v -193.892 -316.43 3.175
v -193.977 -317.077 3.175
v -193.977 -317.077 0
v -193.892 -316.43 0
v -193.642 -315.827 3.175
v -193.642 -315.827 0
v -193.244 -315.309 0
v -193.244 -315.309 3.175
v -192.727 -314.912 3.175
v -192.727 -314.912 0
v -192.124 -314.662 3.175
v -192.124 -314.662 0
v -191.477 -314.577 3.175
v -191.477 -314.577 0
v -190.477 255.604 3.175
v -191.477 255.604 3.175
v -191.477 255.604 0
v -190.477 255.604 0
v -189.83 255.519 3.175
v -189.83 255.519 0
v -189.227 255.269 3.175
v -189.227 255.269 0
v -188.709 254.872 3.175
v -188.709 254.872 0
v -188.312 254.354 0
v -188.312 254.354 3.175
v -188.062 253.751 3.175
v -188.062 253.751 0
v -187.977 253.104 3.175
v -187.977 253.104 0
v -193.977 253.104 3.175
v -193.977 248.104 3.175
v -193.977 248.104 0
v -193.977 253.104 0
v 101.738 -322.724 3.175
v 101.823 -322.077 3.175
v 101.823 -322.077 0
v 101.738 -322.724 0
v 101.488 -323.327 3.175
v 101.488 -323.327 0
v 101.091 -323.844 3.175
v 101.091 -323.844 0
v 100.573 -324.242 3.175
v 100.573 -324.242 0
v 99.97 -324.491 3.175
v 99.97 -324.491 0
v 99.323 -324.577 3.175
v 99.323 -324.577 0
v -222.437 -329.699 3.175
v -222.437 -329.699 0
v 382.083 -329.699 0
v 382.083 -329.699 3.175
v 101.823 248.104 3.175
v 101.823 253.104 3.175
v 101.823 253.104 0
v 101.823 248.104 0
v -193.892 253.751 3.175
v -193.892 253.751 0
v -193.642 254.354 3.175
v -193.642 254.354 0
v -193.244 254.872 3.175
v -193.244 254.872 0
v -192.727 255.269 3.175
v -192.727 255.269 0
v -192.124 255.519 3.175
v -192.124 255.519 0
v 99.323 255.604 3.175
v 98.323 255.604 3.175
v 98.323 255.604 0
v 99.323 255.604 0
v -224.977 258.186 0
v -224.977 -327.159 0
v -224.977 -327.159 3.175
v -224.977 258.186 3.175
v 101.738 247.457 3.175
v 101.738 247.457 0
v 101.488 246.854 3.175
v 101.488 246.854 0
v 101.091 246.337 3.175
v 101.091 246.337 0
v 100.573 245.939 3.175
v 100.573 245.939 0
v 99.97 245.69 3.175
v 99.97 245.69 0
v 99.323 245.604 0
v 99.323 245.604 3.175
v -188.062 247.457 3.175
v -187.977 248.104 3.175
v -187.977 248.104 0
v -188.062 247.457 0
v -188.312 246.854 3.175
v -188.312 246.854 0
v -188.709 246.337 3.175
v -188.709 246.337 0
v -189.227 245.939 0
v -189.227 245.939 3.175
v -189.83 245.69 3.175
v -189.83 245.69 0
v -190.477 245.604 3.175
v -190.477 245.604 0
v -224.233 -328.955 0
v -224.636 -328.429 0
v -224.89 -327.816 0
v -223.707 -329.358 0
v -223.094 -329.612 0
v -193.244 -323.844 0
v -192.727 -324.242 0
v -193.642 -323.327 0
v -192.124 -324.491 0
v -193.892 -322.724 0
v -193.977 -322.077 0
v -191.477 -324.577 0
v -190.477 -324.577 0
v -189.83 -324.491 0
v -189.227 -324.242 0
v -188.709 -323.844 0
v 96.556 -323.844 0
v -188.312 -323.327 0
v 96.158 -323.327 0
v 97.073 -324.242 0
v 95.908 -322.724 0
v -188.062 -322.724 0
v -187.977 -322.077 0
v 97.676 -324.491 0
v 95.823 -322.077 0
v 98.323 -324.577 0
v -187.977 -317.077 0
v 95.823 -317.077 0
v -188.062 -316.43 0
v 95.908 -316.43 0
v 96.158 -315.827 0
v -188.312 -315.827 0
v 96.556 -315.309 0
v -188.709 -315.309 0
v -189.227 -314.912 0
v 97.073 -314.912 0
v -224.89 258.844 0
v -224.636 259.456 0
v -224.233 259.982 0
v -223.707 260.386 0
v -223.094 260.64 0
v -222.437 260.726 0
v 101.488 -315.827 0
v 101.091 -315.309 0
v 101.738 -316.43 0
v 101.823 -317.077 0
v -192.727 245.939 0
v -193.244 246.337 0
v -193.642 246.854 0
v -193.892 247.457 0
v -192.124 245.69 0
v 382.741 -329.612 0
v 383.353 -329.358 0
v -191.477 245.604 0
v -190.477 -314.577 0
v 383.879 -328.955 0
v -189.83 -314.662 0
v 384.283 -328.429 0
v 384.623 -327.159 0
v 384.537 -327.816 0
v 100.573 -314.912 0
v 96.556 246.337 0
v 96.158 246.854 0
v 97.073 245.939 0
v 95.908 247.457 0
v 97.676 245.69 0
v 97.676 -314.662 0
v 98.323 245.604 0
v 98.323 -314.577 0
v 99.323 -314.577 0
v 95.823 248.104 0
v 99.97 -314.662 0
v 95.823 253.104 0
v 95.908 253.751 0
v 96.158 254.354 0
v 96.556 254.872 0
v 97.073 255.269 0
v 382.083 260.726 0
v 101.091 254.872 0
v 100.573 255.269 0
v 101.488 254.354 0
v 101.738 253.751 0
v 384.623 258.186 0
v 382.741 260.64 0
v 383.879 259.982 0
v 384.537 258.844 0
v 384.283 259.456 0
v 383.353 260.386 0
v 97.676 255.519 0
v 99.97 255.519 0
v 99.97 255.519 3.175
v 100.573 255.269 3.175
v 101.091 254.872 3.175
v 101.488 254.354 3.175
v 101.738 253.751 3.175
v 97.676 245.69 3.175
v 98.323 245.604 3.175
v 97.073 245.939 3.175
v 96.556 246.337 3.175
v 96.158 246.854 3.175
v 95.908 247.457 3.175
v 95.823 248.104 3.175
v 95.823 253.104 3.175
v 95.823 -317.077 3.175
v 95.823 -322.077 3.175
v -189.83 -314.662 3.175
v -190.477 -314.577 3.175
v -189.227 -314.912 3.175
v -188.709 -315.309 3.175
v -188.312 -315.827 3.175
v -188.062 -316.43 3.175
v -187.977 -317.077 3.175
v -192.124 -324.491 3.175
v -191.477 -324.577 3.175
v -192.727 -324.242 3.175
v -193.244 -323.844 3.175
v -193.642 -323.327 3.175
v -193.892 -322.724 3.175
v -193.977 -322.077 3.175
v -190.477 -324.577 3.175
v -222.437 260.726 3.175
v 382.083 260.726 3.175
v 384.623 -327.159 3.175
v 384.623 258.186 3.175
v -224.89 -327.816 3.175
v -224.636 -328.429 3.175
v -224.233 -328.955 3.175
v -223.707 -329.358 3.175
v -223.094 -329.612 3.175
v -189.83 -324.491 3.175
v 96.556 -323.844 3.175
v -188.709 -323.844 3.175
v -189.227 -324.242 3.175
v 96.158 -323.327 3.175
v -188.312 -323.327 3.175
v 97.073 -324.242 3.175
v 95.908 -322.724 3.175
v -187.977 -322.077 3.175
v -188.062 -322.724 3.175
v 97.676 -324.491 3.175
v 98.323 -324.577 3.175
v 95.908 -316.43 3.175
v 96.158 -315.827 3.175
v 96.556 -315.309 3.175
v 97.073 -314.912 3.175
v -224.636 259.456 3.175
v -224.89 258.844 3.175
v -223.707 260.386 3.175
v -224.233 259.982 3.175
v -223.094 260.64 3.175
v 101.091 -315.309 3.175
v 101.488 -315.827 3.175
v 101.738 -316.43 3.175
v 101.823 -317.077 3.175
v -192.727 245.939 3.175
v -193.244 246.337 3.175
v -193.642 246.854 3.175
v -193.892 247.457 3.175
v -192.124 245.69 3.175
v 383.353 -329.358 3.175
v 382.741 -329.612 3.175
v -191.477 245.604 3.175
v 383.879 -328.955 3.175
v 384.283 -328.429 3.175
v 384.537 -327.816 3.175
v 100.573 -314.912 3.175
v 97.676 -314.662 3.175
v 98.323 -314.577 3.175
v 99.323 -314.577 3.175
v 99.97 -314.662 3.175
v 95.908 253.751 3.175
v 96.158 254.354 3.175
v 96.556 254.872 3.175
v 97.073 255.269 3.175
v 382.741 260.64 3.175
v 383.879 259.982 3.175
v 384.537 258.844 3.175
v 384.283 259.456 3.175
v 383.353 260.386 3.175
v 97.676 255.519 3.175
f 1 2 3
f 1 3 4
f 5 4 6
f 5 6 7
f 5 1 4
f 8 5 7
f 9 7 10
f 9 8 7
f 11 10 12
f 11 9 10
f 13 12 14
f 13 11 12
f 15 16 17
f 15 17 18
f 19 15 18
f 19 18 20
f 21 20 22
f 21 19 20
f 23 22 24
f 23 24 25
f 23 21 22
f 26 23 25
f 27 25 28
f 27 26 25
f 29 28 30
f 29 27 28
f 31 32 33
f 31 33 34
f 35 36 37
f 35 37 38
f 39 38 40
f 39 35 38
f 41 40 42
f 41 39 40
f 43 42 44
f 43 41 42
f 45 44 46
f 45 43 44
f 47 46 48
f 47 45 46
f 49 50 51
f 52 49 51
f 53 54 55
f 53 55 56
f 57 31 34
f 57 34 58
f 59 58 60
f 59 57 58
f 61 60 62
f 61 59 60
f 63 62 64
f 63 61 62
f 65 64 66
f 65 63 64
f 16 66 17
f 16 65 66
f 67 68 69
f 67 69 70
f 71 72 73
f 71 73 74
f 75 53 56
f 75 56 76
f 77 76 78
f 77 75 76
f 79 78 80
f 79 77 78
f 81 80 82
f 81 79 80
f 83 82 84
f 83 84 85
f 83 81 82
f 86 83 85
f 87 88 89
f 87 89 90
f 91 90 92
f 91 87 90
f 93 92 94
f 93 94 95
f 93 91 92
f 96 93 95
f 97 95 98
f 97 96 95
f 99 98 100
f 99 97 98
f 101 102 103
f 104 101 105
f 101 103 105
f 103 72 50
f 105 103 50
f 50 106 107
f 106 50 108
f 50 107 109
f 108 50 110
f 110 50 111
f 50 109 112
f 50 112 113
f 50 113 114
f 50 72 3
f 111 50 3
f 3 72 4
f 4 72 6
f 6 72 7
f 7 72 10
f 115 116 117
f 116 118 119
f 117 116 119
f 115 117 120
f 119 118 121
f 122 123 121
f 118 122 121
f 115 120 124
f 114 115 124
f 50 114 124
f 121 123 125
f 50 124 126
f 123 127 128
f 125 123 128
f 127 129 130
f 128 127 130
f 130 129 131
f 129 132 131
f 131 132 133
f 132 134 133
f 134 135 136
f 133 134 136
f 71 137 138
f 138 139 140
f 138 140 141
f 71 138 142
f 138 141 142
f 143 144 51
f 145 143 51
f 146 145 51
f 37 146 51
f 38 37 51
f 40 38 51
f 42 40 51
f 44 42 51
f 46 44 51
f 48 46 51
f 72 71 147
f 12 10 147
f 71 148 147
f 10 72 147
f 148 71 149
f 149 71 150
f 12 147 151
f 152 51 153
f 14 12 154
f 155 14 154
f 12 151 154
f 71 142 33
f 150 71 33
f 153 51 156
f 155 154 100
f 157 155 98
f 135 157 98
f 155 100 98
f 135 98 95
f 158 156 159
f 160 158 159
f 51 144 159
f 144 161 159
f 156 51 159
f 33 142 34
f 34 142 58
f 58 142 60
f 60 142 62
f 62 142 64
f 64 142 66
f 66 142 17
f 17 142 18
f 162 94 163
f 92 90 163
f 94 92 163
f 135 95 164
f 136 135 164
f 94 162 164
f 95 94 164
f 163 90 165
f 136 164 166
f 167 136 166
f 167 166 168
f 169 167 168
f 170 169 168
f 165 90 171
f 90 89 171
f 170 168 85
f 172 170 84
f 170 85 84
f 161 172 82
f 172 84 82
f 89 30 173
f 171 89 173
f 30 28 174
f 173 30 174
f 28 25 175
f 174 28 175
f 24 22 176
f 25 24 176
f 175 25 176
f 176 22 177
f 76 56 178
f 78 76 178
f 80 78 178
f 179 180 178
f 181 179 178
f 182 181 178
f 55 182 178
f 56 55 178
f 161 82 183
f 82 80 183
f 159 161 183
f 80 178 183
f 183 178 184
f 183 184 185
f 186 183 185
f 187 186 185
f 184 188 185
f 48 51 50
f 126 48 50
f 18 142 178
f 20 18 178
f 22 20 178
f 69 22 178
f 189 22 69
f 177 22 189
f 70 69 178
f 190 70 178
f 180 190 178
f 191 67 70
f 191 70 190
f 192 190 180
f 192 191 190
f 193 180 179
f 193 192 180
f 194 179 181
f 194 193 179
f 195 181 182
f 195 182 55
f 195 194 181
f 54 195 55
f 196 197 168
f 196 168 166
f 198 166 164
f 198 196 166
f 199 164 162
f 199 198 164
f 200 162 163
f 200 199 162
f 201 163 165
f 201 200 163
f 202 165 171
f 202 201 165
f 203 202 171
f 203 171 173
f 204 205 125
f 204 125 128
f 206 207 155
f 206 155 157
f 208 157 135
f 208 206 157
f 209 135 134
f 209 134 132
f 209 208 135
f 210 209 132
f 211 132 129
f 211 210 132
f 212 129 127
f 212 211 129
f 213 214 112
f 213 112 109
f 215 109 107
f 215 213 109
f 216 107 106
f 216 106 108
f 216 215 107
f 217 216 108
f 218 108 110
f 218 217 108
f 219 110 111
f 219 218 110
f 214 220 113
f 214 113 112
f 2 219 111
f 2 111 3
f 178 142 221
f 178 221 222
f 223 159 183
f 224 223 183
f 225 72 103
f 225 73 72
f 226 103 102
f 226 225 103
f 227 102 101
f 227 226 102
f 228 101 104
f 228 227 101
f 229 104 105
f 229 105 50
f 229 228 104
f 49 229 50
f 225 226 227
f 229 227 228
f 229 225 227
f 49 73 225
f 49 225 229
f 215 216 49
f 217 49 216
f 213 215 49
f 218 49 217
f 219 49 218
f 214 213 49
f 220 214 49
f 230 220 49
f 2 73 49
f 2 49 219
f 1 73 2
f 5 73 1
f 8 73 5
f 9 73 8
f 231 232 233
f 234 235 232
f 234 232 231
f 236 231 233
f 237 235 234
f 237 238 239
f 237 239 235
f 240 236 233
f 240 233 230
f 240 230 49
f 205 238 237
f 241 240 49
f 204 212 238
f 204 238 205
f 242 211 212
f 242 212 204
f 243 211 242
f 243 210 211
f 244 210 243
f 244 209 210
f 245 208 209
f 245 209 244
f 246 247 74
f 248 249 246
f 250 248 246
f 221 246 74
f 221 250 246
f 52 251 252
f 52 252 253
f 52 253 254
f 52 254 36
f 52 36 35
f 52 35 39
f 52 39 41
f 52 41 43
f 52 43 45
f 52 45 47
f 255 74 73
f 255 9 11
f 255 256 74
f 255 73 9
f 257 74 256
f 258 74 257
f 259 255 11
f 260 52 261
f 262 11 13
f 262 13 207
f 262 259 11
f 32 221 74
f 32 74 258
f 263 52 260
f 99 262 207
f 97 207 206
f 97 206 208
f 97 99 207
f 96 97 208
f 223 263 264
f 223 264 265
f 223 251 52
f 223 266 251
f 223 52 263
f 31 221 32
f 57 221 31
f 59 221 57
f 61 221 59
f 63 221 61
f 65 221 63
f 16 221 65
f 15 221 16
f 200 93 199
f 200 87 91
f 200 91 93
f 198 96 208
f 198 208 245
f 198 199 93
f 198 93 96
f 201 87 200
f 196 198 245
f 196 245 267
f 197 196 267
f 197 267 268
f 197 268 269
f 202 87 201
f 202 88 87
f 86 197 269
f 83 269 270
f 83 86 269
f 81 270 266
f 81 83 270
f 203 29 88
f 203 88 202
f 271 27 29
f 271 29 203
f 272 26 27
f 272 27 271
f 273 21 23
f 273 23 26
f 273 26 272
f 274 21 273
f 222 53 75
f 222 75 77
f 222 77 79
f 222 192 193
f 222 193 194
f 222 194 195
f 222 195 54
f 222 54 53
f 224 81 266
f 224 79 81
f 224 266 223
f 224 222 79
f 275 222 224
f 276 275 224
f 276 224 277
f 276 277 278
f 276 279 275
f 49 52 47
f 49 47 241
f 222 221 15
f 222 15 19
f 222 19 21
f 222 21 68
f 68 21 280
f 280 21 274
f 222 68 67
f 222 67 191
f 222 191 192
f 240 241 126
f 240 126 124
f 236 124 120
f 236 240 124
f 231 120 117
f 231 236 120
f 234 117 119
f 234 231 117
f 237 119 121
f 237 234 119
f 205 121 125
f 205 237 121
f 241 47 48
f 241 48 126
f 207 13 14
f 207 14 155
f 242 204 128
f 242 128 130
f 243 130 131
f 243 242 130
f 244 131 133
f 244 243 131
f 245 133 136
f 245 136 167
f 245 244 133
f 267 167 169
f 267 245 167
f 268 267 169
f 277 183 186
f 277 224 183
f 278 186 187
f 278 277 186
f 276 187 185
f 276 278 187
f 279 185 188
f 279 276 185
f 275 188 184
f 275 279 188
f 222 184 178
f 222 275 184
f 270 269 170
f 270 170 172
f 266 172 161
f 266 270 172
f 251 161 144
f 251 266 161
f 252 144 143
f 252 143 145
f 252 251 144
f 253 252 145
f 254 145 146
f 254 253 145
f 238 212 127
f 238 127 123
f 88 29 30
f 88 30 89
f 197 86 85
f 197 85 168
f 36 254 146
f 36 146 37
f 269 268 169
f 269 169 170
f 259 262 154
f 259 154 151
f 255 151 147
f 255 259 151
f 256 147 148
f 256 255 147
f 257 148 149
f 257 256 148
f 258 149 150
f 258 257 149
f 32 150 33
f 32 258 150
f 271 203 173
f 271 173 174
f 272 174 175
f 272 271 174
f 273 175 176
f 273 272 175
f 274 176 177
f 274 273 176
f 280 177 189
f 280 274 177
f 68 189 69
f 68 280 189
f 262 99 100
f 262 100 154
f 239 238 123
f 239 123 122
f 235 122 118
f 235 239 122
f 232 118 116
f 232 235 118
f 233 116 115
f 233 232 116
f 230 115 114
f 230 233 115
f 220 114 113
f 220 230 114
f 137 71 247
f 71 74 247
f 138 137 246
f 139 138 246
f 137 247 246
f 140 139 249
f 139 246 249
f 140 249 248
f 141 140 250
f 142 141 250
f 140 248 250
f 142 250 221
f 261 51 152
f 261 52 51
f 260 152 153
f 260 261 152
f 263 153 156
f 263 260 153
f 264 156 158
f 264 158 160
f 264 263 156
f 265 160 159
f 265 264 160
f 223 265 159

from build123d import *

# Parameters (mm, degrees)
SKETCH1_W           = 609.6
SKETCH1_H           = 590.425
BOSS_EXTRUDE1_DEPTH = 3.175
FILLET1_R           = 2.54
CUT_EXTRUDE1_DEPTH  = 3.175


with BuildPart() as part:
    # Sketch1 → Boss-Extrude1 (new body)
    with BuildSketch(Plane.XY):
        with Locations((79.823295573, -34.486097285)):
            Rectangle(SKETCH1_W, SKETCH1_H)
    extrude(amount=BOSS_EXTRUDE1_DEPTH)

    # Fillet1
    fillet1_edges = [part.edges().sort_by_distance(p)[0] for p in [
        (-224.976704427, 260.726402715, 1.5875),
        (-224.976704427, -329.698597285, 1.5875),
        (384.623295573, -329.698597285, 1.5875),
        (384.623295573, 260.726402715, 1.5875),
    ]]
    fillet(fillet1_edges, radius=FILLET1_R)

    # Sketch2 → Cut-Extrude1 (cut)
    with BuildSketch(Plane.XY.offset(3.175)):
        with BuildLine():
            Line((-190.476704427, 245.604402715), (-191.476704427, 245.604402715))
            ThreePointArc((-191.476704427, 245.604402715), (-193.24447138, 246.336635762), (-193.976704427, 248.104402715))
            Line((-193.976704427, 248.104402715), (-193.976704427, 253.104402715))
            ThreePointArc((-193.976704427, 253.104402715), (-193.24447138, 254.872169668), (-191.476704427, 255.604402715))
            Line((-191.476704427, 255.604402715), (-190.476704427, 255.604402715))
            ThreePointArc((-190.476704427, 255.604402715), (-188.708937474, 254.872169668), (-187.976704427, 253.104402715))
            Line((-187.976704427, 253.104402715), (-187.976704427, 248.104402715))
            ThreePointArc((-187.976704427, 248.104402715), (-188.708937474, 246.336635762), (-190.476704427, 245.604402715))
        make_face()
        with BuildLine():
            Line((99.323295573, 245.604402715), (98.323295573, 245.604402715))
            ThreePointArc((98.323295573, 245.604402715), (96.55552862, 246.336635762), (95.823295573, 248.104402715))
            Line((95.823295573, 248.104402715), (95.823295573, 253.104402715))
            ThreePointArc((95.823295573, 253.104402715), (96.55552862, 254.872169668), (98.323295573, 255.604402715))
            Line((98.323295573, 255.604402715), (99.323295573, 255.604402715))
            ThreePointArc((99.323295573, 255.604402715), (101.091062526, 254.872169668), (101.823295573, 253.104402715))
            Line((101.823295573, 253.104402715), (101.823295573, 248.104402715))
            ThreePointArc((101.823295573, 248.104402715), (101.091062526, 246.336635762), (99.323295573, 245.604402715))
        make_face()
        with BuildLine():
            Line((389.123295573, 245.604402715), (388.123295573, 245.604402715))
            ThreePointArc((388.123295573, 245.604402715), (386.35552862, 246.336635762), (385.623295573, 248.104402715))
            Line((385.623295573, 248.104402715), (385.623295573, 253.104402715))
            ThreePointArc((385.623295573, 253.104402715), (386.35552862, 254.872169668), (388.123295573, 255.604402715))
            Line((388.123295573, 255.604402715), (389.123295573, 255.604402715))
            ThreePointArc((389.123295573, 255.604402715), (390.891062526, 254.872169668), (391.623295573, 253.104402715))
            Line((391.623295573, 253.104402715), (391.623295573, 248.104402715))
            ThreePointArc((391.623295573, 248.104402715), (390.891062526, 246.336635762), (389.123295573, 245.604402715))
        make_face()
        with BuildLine():
            Line((391.623295573, -317.076597285), (391.623295573, -322.076597285))
            ThreePointArc((391.623295573, -322.076597285), (390.891062526, -323.844364238), (389.123295573, -324.576597285))
            Line((389.123295573, -324.576597285), (388.123295573, -324.576597285))
            ThreePointArc((388.123295573, -324.576597285), (386.35552862, -323.844364238), (385.623295573, -322.076597285))
            Line((385.623295573, -322.076597285), (385.623295573, -317.076597285))
            ThreePointArc((385.623295573, -317.076597285), (386.35552862, -315.308830332), (388.123295573, -314.576597285))
            Line((388.123295573, -314.576597285), (389.123295573, -314.576597285))
            ThreePointArc((389.123295573, -314.576597285), (390.891062526, -315.308830332), (391.623295573, -317.076597285))
        make_face()
        with BuildLine():
            Line((101.823295573, -317.076597285), (101.823295573, -322.076597285))
            ThreePointArc((101.823295573, -322.076597285), (101.091062526, -323.844364238), (99.323295573, -324.576597285))
            Line((99.323295573, -324.576597285), (98.323295573, -324.576597285))
            ThreePointArc((98.323295573, -324.576597285), (96.55552862, -323.844364238), (95.823295573, -322.076597285))
            Line((95.823295573, -322.076597285), (95.823295573, -317.076597285))
            ThreePointArc((95.823295573, -317.076597285), (96.55552862, -315.308830332), (98.323295573, -314.576597285))
            Line((98.323295573, -314.576597285), (99.323295573, -314.576597285))
            ThreePointArc((99.323295573, -314.576597285), (101.091062526, -315.308830332), (101.823295573, -317.076597285))
        make_face()
        with BuildLine():
            Line((-187.976704427, -317.076597285), (-187.976704427, -322.076597285))
            ThreePointArc((-187.976704427, -322.076597285), (-188.708937474, -323.844364238), (-190.476704427, -324.576597285))
            Line((-190.476704427, -324.576597285), (-191.476704427, -324.576597285))
            ThreePointArc((-191.476704427, -324.576597285), (-193.24447138, -323.844364238), (-193.976704427, -322.076597285))
            Line((-193.976704427, -322.076597285), (-193.976704427, -317.076597285))
            ThreePointArc((-193.976704427, -317.076597285), (-193.24447138, -315.308830332), (-191.476704427, -314.576597285))
            Line((-191.476704427, -314.576597285), (-190.476704427, -314.576597285))
            ThreePointArc((-190.476704427, -314.576597285), (-188.708937474, -315.308830332), (-187.976704427, -317.076597285))
        make_face()
    extrude(amount=-CUT_EXTRUDE1_DEPTH, mode=Mode.SUBTRACT)


solid = part.part
